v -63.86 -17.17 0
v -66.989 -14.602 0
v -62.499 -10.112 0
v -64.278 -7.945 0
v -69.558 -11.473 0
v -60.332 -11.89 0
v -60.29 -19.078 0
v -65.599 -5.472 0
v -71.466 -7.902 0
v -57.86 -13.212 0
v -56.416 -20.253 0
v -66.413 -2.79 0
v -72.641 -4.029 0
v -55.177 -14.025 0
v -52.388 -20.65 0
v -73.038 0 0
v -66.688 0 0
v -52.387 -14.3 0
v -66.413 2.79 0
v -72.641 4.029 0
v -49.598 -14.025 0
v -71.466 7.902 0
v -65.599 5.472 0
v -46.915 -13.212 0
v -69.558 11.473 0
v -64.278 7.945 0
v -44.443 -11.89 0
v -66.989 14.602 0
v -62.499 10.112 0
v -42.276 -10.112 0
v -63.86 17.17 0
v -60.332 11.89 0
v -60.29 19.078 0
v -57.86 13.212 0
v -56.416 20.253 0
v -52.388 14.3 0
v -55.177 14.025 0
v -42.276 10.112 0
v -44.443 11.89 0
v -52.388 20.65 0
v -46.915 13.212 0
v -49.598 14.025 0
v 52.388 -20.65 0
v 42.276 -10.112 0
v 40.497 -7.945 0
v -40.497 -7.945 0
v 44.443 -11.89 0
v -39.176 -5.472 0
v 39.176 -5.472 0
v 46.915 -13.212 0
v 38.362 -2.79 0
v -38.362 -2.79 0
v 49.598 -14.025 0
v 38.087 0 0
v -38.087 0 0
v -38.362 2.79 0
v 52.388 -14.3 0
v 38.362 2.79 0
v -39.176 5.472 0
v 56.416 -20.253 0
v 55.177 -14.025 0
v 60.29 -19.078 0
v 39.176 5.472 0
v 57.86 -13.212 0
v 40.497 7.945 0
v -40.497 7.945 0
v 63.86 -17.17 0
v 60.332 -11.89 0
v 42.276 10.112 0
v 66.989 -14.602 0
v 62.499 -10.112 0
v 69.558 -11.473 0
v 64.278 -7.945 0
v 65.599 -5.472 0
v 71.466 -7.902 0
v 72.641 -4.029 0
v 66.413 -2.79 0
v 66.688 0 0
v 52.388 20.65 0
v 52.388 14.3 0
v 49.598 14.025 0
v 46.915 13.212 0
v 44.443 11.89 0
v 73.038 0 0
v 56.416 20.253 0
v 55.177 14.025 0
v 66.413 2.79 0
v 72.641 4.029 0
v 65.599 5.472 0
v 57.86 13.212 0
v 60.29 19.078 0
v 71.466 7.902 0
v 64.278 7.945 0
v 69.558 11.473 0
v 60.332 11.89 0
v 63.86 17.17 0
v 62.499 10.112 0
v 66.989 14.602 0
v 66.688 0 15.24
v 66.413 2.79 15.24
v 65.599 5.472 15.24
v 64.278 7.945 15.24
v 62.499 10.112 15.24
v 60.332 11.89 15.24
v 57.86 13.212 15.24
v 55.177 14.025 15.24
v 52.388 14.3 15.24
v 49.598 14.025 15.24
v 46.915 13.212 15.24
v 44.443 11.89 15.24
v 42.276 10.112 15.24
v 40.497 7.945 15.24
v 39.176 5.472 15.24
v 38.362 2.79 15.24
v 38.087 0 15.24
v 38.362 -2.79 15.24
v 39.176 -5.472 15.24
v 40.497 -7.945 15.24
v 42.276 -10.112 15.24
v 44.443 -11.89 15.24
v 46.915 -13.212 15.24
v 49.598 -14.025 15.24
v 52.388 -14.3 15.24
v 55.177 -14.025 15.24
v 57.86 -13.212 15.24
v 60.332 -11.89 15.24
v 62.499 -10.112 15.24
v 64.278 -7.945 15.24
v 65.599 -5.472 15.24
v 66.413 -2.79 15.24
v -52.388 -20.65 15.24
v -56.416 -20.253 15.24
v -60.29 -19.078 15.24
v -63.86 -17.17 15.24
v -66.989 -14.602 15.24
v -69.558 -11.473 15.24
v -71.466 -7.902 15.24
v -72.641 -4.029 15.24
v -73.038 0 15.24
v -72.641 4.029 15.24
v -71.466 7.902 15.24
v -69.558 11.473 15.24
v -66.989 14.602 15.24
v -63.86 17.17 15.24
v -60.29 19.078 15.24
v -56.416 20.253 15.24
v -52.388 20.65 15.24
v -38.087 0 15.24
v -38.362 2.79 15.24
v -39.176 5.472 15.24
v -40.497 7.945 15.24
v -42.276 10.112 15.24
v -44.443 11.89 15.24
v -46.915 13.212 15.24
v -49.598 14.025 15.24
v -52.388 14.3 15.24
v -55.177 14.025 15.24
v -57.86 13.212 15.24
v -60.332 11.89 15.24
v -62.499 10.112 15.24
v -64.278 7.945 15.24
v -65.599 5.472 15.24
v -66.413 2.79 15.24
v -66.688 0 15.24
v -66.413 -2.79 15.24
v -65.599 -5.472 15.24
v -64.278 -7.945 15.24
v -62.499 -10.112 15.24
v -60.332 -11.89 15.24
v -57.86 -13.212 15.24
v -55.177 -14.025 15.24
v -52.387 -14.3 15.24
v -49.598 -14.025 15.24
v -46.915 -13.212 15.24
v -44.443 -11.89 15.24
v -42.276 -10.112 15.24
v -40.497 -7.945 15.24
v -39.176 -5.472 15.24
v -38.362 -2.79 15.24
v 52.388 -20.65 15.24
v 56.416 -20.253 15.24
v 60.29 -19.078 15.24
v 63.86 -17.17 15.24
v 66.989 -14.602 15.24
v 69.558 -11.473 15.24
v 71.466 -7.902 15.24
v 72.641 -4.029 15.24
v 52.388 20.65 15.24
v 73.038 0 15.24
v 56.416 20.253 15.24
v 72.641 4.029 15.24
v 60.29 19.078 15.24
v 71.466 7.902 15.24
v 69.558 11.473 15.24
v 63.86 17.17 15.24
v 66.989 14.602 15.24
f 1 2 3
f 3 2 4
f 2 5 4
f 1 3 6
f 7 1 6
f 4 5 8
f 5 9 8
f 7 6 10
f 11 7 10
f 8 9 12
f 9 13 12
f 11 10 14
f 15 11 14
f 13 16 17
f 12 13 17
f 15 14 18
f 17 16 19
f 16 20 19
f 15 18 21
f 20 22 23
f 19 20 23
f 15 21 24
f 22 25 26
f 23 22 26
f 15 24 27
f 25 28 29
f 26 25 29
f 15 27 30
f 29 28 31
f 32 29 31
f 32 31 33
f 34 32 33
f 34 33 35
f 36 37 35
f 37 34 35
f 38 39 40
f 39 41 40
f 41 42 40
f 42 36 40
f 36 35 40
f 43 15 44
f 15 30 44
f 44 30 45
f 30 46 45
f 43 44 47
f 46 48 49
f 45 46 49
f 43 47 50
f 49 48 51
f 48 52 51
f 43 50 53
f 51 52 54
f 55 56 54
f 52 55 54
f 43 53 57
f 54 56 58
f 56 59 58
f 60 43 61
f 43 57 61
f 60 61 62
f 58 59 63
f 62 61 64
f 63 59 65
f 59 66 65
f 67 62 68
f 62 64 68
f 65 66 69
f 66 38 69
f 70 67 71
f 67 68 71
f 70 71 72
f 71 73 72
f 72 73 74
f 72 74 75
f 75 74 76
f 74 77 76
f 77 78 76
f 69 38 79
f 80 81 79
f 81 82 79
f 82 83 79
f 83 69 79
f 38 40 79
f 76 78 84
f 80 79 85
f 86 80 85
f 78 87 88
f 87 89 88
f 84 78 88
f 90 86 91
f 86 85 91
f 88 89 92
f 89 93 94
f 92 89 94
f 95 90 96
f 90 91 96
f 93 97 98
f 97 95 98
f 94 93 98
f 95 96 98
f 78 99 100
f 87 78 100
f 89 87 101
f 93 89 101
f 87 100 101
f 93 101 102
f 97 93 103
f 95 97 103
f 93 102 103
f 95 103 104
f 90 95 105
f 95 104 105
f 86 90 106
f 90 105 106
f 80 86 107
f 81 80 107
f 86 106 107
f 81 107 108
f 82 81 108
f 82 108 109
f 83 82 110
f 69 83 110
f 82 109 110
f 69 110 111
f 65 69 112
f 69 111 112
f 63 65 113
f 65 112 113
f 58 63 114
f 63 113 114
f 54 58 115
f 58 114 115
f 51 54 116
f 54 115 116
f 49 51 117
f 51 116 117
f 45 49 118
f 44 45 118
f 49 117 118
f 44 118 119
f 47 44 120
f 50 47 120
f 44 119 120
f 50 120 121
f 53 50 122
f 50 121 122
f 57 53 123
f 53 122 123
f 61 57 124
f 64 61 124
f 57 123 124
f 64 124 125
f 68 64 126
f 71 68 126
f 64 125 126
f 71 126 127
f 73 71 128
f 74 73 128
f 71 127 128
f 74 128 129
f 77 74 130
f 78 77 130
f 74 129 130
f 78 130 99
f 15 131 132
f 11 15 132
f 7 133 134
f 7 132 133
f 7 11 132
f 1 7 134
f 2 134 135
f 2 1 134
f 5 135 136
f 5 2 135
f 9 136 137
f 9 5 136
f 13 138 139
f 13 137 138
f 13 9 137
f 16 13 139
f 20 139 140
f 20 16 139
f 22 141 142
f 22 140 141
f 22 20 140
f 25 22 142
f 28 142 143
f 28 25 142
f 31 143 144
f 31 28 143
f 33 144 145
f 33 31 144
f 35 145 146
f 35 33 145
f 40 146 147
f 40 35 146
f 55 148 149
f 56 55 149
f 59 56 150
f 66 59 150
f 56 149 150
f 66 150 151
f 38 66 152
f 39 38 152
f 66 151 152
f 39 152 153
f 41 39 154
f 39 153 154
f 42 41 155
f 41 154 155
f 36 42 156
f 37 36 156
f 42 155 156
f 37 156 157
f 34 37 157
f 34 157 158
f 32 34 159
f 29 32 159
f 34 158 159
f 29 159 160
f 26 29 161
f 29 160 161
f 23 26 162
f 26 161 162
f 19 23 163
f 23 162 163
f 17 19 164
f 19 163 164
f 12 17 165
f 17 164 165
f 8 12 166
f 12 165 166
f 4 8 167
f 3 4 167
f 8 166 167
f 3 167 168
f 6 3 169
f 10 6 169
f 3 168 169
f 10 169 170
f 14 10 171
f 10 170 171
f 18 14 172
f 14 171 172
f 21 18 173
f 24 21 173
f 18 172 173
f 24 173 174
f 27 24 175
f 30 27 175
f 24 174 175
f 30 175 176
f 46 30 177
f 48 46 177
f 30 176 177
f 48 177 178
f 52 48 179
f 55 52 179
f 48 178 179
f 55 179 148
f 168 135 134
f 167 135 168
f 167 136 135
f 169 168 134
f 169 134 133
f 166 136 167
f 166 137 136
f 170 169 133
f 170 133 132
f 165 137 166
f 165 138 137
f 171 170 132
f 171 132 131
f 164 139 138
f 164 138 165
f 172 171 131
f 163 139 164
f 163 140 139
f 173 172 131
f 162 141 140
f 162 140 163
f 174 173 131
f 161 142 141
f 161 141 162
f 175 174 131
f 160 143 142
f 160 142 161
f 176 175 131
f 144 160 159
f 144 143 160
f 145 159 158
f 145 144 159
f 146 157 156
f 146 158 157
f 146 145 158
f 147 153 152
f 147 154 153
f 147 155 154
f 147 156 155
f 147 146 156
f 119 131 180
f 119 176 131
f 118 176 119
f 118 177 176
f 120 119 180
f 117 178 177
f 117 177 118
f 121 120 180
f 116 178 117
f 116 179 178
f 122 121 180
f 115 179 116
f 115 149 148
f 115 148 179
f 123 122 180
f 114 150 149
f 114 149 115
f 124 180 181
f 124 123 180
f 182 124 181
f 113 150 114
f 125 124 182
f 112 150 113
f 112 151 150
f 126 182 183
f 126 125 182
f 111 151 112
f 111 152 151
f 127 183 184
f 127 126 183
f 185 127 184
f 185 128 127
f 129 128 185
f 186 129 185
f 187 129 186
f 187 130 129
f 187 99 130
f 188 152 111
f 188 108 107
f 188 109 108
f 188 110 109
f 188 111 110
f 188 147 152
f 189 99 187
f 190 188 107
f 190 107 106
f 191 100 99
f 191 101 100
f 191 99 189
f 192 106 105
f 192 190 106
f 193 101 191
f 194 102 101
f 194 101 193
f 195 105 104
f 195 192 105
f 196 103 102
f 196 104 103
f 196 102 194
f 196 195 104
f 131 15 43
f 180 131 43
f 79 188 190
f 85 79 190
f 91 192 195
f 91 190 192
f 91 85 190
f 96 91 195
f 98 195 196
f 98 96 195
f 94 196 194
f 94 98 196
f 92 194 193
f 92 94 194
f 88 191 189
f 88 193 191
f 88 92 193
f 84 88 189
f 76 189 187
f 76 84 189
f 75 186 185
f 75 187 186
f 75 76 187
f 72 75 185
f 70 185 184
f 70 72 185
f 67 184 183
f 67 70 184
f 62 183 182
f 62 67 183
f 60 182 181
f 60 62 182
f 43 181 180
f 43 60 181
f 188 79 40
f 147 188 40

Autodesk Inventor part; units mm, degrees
ref_plane "YZ Plane" through (0, 0, 0) normal (1, 0, 0) x (0, 1, 0)
ref_plane "XZ Plane" through (0, 0, 0) normal (0, 1, 0) x (-1, 0, 0)
ref_plane "XY Plane" through (0, 0, 0) normal (0, 0, 1) x (1, 0, 0)
sketch "Sketch1" plane through (0, 0, 0) normal (0, 0, 1) x (1, 0, 0)
  line L0 (-52.3875, 0) -> (52.3875, 0) construction
  line L1 (-52.3875, -20.6502) -> (52.3875, -20.6502)
  line L2 (52.3875, 20.6502) -> (-52.3875, 20.6502)
  arc A0 (-52.3875, 20.6502) -> (-52.3875, -20.6502) centre (-52.3875, 0) ccw
  arc A1 (52.3875, -20.6502) -> (52.3875, 20.6502) centre (52.3875, 0) ccw
  point P0 (0, 0)
  dimension "d0" = 104.775
  dimension "d1" = 20.6502
extrude "Extrusion1" add sketch "Sketch1" along normal blind 15.24
sketch "Sketch2" plane through (0, 0, 15.24) normal (0, 0, 1) x (1, 0, 0)
  arc A0 (-52.3875, 20.6502) -> (-52.3875, -20.6502) centre (-52.3875, 0) ccw projected
  circle A1 centre (-52.3875, 0) radius 14.3002
  arc A2 (52.3875, -20.6502) -> (52.3875, 20.6502) centre (52.3875, 0) ccw projected
  circle A3 centre (52.3875, 0) radius 14.3002
  point P0 (0, 0)
  dimension "d4" = 28.6004
extrude "Extrusion2" cut sketch "Sketch2" against normal through all
properties part number "IntakeChainLink"
